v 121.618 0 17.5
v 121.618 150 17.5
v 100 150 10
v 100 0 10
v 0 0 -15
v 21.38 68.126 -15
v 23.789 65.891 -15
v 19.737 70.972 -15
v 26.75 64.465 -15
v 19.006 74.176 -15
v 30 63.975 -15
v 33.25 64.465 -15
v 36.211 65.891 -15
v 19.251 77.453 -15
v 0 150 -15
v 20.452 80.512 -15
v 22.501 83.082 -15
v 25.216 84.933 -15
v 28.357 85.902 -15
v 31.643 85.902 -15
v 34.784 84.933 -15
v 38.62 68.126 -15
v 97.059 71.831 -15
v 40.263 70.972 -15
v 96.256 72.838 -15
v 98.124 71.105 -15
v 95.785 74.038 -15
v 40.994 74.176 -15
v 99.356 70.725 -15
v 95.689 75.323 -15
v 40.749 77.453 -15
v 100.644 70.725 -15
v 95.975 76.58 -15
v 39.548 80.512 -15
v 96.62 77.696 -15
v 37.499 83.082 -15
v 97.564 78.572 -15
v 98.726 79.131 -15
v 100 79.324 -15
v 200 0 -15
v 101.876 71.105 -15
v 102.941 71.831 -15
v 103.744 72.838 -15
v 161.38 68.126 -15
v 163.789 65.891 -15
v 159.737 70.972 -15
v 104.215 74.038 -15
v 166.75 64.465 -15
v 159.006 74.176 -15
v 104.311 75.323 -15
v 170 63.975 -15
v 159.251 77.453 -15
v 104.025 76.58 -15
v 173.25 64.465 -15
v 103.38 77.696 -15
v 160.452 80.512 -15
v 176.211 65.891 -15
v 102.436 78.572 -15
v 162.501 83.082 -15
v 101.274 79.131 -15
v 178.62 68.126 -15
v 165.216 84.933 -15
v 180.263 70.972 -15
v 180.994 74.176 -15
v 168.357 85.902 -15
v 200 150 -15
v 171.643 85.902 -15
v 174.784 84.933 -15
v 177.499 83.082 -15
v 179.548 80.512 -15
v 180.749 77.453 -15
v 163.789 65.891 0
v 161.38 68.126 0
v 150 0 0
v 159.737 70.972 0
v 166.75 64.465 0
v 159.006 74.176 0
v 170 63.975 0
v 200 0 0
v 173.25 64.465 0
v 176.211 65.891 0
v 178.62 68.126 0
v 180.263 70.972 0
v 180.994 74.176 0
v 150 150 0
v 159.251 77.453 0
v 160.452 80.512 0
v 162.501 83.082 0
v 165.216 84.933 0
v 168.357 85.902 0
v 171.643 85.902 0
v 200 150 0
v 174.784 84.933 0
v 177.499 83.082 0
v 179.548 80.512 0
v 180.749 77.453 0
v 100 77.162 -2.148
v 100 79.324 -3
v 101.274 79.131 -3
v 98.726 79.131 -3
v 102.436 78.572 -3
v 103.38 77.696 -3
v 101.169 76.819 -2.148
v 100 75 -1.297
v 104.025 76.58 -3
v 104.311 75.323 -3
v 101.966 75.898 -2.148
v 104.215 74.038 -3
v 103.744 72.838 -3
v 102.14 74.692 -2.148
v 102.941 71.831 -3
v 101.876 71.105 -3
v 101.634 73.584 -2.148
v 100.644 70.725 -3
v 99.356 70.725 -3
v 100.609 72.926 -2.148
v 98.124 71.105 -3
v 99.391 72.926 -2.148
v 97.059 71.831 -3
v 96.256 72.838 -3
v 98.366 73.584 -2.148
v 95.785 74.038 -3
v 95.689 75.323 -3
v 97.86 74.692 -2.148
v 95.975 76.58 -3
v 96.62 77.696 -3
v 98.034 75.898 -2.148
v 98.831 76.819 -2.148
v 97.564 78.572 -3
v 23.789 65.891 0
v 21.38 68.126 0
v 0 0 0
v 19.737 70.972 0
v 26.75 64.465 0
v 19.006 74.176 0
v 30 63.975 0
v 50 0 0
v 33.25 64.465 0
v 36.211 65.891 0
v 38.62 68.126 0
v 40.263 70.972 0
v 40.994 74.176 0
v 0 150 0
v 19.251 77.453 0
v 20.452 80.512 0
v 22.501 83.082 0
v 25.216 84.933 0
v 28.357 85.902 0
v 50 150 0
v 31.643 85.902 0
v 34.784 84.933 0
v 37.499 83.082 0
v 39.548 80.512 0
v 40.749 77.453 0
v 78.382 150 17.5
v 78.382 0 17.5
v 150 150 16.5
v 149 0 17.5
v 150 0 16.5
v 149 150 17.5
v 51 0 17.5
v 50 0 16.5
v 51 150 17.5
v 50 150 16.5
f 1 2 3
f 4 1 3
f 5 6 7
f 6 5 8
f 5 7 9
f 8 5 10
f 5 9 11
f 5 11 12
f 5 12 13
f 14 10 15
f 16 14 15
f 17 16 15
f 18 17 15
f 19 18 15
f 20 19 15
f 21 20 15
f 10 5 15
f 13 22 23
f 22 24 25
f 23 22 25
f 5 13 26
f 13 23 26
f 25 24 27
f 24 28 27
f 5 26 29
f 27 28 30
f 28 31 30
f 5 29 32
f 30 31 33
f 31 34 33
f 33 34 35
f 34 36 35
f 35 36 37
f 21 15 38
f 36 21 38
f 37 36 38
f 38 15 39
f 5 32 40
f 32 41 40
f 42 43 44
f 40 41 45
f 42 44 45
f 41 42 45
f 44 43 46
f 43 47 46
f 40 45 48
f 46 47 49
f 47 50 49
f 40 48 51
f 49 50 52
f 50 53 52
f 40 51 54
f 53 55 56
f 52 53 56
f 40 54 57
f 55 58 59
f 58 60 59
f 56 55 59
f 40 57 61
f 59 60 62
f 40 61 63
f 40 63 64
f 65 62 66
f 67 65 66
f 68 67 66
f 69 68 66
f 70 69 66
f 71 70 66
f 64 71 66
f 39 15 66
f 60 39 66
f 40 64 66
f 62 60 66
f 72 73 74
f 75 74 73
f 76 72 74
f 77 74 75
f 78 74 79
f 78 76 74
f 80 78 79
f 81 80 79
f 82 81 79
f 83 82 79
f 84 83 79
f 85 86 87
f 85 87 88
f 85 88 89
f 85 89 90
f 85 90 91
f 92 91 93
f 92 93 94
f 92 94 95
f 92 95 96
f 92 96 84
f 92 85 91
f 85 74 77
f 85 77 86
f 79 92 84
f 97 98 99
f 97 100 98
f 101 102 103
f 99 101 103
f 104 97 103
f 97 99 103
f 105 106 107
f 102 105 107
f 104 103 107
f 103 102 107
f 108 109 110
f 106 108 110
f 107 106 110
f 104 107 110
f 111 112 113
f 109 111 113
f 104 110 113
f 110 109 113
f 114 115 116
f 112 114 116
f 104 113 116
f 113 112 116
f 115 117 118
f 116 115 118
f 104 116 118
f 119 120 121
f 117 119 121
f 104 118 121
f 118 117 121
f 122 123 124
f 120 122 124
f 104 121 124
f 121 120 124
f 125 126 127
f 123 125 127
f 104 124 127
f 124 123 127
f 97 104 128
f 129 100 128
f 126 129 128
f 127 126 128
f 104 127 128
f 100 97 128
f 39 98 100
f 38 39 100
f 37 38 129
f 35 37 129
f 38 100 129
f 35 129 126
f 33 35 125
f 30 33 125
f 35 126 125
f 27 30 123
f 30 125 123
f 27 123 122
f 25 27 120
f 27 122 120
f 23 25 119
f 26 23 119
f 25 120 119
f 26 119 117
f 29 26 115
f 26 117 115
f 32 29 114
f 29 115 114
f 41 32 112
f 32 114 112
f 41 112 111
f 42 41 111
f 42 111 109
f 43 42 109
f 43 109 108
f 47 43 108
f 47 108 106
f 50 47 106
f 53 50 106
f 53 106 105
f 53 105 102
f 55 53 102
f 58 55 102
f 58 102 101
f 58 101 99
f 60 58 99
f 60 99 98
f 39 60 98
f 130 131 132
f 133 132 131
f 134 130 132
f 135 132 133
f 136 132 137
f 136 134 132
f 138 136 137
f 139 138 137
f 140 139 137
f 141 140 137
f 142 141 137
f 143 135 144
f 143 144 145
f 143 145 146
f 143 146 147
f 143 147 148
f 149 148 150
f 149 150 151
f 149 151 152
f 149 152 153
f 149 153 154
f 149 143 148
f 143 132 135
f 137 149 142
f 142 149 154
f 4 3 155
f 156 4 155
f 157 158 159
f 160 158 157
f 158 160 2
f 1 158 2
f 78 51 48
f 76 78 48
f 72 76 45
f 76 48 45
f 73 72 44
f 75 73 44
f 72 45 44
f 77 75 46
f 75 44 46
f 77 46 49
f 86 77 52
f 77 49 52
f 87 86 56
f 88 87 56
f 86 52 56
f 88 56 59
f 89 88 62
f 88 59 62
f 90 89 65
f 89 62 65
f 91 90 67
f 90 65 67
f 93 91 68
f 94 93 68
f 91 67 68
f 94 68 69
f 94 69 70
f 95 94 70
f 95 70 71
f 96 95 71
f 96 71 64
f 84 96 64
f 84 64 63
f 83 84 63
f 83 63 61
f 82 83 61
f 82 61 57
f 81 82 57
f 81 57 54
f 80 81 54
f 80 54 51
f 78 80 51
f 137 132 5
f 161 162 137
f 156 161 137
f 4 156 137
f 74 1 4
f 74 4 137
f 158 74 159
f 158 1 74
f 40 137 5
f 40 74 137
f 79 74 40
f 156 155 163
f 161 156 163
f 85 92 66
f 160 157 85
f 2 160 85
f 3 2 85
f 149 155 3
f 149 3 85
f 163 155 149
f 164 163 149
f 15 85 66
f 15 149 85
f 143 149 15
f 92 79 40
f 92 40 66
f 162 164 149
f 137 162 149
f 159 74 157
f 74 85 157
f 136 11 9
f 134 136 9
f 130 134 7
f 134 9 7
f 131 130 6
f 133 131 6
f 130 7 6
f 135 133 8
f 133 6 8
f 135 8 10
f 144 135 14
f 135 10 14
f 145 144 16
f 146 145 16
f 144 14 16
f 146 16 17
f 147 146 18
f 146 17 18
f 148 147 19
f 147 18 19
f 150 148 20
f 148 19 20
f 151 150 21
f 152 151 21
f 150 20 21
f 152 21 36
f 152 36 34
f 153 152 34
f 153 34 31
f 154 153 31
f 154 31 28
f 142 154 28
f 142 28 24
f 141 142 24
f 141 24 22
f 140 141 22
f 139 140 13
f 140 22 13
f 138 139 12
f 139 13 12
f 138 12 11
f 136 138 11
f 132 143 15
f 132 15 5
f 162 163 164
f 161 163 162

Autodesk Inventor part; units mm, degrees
ref_plane "YZ Plane" through (0, 0, 0) normal (1, 0, 0) x (0, 1, 0)
ref_plane "XZ Plane" through (0, 0, 0) normal (0, 1, 0) x (-1, 0, 0)
ref_plane "XY Plane" through (0, 0, 0) normal (0, 0, 1) x (1, 0, 0)
sketch "Sketch2" plane through (0, 0, 0) normal (0, 0, 1) x (1, 0, 0)
  line L0 (0, 0) -> (200, 0)
  line L1 (200, 0) -> (200, 150)
  line L2 (200, 150) -> (0, 150)
  line L3 (0, 150) -> (0, 0)
  dimension "d4" = 150
  dimension "d5" = 200
extrude "Extrusion2" add sketch "Sketch2" against normal blind 15
sketch "Sketch3" plane through (0, 0, 0) normal (0, 0, 1) x (1, 0, 0)
  line L0 (200, 150) -> (0, 150) projected
  line L1 (0, 150) -> (0, 0) projected
  point P0 (30, 75)
  point P1 (170, 75)
  dimension "d11" = 75
  dimension "d12" = 75
  dimension "d13" = 140
  dimension "d14" = 30
hole "Hole1" at (30, 75, 0) at (170, 75, 0) direction (0, 0, -1) diameter 22.05 end through all
sketch "Sketch6" plane through (0, 150, 0) normal (0, 1, 0) x (1, 0, 0)
  line L0 (0, 0) -> (200, 0) projected
  line L1 (50, 0) -> (150, 0)
  line L2 (150, 0) -> (150, -17.5)
  line L3 (50, -17.5) -> (50, 0)
  line L4 (0, 0) -> (0, 15) projected
  line L5 (150, -17.5) -> (121.618, -17.5)
  line L6 (121.618, -17.5) -> (100, -10)
  line L7 (100, -10) -> (78.382, -17.5)
  line L8 (78.382, -17.5) -> (50, -17.5)
  line L9 (0, 15) -> (200, 15) projected
  line L10 (200, 0) -> (200, 15) projected
  dimension "d36" = 50
  dimension "d37" = 100
  dimension "d42" = 17.5
  dimension "d45" = 28.382
  dimension "d81" = 7.5
extrude "Extrusion3" add sketch "Sketch6" against normal blind 150 contours L0 L2 L5 L6 L7 L8 L3
chamfer "Chamfer1" distance 1 angle 45 2 edges at (150, 75, 17.5) (50, 75, 17.5)
sketch "Sketch7" plane through (0, 0, -15) normal (0, 0, -1) x (-1, 0, 0)
  line L0 (-100, 150) -> (-100, 0) projected
  line L1 (-200, 0) -> (0, 0) projected
  line L2 (0, 0) -> (0, 150) projected
  point P0 (-100, 75)
  dimension "d54" = 75
  dimension "d55" = 100
hole "Hole3" at (100, 75, -15) direction (0, 0, 1) diameter 8.647 depth 12 tip angle 137 thread size "M10x1.25" class "6H" standard "ISO Metric profile"
equation "\"d12\" = d11"
properties part number "Soporte Superior Tubos"
